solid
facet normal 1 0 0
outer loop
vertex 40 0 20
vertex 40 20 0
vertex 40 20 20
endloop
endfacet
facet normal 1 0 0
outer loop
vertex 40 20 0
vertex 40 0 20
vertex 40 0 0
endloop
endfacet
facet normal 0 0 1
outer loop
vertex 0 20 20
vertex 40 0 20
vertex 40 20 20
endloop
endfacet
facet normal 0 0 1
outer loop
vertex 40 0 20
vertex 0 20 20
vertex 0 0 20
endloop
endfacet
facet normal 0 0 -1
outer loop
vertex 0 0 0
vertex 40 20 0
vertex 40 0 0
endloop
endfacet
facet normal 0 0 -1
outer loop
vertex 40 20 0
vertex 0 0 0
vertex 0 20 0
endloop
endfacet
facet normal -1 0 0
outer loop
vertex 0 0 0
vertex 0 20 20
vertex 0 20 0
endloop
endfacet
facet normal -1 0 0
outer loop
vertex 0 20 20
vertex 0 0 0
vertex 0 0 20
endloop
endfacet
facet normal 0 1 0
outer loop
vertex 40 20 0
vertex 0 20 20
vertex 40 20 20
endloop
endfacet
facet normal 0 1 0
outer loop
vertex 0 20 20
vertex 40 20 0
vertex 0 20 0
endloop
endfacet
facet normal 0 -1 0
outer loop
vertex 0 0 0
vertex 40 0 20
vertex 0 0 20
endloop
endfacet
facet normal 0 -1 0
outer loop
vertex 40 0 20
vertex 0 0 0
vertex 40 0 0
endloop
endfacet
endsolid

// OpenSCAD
// Dimensions
base_length = 40;
base_width = 20;
base_height = 20;

wedge_length = base_length;
wedge_height = 20;

// Main block
difference() {
    // Base rectangular block
    cube([base_length, base_width, base_height]);

    // Wedge cut
    translate([0, 0, base_height])
        rotate([0, 90, 0])
            linear_extrude(height = base_length)
                polygon(points=[[0,0], [base_width,0], [0,-wedge_height]]);
}
